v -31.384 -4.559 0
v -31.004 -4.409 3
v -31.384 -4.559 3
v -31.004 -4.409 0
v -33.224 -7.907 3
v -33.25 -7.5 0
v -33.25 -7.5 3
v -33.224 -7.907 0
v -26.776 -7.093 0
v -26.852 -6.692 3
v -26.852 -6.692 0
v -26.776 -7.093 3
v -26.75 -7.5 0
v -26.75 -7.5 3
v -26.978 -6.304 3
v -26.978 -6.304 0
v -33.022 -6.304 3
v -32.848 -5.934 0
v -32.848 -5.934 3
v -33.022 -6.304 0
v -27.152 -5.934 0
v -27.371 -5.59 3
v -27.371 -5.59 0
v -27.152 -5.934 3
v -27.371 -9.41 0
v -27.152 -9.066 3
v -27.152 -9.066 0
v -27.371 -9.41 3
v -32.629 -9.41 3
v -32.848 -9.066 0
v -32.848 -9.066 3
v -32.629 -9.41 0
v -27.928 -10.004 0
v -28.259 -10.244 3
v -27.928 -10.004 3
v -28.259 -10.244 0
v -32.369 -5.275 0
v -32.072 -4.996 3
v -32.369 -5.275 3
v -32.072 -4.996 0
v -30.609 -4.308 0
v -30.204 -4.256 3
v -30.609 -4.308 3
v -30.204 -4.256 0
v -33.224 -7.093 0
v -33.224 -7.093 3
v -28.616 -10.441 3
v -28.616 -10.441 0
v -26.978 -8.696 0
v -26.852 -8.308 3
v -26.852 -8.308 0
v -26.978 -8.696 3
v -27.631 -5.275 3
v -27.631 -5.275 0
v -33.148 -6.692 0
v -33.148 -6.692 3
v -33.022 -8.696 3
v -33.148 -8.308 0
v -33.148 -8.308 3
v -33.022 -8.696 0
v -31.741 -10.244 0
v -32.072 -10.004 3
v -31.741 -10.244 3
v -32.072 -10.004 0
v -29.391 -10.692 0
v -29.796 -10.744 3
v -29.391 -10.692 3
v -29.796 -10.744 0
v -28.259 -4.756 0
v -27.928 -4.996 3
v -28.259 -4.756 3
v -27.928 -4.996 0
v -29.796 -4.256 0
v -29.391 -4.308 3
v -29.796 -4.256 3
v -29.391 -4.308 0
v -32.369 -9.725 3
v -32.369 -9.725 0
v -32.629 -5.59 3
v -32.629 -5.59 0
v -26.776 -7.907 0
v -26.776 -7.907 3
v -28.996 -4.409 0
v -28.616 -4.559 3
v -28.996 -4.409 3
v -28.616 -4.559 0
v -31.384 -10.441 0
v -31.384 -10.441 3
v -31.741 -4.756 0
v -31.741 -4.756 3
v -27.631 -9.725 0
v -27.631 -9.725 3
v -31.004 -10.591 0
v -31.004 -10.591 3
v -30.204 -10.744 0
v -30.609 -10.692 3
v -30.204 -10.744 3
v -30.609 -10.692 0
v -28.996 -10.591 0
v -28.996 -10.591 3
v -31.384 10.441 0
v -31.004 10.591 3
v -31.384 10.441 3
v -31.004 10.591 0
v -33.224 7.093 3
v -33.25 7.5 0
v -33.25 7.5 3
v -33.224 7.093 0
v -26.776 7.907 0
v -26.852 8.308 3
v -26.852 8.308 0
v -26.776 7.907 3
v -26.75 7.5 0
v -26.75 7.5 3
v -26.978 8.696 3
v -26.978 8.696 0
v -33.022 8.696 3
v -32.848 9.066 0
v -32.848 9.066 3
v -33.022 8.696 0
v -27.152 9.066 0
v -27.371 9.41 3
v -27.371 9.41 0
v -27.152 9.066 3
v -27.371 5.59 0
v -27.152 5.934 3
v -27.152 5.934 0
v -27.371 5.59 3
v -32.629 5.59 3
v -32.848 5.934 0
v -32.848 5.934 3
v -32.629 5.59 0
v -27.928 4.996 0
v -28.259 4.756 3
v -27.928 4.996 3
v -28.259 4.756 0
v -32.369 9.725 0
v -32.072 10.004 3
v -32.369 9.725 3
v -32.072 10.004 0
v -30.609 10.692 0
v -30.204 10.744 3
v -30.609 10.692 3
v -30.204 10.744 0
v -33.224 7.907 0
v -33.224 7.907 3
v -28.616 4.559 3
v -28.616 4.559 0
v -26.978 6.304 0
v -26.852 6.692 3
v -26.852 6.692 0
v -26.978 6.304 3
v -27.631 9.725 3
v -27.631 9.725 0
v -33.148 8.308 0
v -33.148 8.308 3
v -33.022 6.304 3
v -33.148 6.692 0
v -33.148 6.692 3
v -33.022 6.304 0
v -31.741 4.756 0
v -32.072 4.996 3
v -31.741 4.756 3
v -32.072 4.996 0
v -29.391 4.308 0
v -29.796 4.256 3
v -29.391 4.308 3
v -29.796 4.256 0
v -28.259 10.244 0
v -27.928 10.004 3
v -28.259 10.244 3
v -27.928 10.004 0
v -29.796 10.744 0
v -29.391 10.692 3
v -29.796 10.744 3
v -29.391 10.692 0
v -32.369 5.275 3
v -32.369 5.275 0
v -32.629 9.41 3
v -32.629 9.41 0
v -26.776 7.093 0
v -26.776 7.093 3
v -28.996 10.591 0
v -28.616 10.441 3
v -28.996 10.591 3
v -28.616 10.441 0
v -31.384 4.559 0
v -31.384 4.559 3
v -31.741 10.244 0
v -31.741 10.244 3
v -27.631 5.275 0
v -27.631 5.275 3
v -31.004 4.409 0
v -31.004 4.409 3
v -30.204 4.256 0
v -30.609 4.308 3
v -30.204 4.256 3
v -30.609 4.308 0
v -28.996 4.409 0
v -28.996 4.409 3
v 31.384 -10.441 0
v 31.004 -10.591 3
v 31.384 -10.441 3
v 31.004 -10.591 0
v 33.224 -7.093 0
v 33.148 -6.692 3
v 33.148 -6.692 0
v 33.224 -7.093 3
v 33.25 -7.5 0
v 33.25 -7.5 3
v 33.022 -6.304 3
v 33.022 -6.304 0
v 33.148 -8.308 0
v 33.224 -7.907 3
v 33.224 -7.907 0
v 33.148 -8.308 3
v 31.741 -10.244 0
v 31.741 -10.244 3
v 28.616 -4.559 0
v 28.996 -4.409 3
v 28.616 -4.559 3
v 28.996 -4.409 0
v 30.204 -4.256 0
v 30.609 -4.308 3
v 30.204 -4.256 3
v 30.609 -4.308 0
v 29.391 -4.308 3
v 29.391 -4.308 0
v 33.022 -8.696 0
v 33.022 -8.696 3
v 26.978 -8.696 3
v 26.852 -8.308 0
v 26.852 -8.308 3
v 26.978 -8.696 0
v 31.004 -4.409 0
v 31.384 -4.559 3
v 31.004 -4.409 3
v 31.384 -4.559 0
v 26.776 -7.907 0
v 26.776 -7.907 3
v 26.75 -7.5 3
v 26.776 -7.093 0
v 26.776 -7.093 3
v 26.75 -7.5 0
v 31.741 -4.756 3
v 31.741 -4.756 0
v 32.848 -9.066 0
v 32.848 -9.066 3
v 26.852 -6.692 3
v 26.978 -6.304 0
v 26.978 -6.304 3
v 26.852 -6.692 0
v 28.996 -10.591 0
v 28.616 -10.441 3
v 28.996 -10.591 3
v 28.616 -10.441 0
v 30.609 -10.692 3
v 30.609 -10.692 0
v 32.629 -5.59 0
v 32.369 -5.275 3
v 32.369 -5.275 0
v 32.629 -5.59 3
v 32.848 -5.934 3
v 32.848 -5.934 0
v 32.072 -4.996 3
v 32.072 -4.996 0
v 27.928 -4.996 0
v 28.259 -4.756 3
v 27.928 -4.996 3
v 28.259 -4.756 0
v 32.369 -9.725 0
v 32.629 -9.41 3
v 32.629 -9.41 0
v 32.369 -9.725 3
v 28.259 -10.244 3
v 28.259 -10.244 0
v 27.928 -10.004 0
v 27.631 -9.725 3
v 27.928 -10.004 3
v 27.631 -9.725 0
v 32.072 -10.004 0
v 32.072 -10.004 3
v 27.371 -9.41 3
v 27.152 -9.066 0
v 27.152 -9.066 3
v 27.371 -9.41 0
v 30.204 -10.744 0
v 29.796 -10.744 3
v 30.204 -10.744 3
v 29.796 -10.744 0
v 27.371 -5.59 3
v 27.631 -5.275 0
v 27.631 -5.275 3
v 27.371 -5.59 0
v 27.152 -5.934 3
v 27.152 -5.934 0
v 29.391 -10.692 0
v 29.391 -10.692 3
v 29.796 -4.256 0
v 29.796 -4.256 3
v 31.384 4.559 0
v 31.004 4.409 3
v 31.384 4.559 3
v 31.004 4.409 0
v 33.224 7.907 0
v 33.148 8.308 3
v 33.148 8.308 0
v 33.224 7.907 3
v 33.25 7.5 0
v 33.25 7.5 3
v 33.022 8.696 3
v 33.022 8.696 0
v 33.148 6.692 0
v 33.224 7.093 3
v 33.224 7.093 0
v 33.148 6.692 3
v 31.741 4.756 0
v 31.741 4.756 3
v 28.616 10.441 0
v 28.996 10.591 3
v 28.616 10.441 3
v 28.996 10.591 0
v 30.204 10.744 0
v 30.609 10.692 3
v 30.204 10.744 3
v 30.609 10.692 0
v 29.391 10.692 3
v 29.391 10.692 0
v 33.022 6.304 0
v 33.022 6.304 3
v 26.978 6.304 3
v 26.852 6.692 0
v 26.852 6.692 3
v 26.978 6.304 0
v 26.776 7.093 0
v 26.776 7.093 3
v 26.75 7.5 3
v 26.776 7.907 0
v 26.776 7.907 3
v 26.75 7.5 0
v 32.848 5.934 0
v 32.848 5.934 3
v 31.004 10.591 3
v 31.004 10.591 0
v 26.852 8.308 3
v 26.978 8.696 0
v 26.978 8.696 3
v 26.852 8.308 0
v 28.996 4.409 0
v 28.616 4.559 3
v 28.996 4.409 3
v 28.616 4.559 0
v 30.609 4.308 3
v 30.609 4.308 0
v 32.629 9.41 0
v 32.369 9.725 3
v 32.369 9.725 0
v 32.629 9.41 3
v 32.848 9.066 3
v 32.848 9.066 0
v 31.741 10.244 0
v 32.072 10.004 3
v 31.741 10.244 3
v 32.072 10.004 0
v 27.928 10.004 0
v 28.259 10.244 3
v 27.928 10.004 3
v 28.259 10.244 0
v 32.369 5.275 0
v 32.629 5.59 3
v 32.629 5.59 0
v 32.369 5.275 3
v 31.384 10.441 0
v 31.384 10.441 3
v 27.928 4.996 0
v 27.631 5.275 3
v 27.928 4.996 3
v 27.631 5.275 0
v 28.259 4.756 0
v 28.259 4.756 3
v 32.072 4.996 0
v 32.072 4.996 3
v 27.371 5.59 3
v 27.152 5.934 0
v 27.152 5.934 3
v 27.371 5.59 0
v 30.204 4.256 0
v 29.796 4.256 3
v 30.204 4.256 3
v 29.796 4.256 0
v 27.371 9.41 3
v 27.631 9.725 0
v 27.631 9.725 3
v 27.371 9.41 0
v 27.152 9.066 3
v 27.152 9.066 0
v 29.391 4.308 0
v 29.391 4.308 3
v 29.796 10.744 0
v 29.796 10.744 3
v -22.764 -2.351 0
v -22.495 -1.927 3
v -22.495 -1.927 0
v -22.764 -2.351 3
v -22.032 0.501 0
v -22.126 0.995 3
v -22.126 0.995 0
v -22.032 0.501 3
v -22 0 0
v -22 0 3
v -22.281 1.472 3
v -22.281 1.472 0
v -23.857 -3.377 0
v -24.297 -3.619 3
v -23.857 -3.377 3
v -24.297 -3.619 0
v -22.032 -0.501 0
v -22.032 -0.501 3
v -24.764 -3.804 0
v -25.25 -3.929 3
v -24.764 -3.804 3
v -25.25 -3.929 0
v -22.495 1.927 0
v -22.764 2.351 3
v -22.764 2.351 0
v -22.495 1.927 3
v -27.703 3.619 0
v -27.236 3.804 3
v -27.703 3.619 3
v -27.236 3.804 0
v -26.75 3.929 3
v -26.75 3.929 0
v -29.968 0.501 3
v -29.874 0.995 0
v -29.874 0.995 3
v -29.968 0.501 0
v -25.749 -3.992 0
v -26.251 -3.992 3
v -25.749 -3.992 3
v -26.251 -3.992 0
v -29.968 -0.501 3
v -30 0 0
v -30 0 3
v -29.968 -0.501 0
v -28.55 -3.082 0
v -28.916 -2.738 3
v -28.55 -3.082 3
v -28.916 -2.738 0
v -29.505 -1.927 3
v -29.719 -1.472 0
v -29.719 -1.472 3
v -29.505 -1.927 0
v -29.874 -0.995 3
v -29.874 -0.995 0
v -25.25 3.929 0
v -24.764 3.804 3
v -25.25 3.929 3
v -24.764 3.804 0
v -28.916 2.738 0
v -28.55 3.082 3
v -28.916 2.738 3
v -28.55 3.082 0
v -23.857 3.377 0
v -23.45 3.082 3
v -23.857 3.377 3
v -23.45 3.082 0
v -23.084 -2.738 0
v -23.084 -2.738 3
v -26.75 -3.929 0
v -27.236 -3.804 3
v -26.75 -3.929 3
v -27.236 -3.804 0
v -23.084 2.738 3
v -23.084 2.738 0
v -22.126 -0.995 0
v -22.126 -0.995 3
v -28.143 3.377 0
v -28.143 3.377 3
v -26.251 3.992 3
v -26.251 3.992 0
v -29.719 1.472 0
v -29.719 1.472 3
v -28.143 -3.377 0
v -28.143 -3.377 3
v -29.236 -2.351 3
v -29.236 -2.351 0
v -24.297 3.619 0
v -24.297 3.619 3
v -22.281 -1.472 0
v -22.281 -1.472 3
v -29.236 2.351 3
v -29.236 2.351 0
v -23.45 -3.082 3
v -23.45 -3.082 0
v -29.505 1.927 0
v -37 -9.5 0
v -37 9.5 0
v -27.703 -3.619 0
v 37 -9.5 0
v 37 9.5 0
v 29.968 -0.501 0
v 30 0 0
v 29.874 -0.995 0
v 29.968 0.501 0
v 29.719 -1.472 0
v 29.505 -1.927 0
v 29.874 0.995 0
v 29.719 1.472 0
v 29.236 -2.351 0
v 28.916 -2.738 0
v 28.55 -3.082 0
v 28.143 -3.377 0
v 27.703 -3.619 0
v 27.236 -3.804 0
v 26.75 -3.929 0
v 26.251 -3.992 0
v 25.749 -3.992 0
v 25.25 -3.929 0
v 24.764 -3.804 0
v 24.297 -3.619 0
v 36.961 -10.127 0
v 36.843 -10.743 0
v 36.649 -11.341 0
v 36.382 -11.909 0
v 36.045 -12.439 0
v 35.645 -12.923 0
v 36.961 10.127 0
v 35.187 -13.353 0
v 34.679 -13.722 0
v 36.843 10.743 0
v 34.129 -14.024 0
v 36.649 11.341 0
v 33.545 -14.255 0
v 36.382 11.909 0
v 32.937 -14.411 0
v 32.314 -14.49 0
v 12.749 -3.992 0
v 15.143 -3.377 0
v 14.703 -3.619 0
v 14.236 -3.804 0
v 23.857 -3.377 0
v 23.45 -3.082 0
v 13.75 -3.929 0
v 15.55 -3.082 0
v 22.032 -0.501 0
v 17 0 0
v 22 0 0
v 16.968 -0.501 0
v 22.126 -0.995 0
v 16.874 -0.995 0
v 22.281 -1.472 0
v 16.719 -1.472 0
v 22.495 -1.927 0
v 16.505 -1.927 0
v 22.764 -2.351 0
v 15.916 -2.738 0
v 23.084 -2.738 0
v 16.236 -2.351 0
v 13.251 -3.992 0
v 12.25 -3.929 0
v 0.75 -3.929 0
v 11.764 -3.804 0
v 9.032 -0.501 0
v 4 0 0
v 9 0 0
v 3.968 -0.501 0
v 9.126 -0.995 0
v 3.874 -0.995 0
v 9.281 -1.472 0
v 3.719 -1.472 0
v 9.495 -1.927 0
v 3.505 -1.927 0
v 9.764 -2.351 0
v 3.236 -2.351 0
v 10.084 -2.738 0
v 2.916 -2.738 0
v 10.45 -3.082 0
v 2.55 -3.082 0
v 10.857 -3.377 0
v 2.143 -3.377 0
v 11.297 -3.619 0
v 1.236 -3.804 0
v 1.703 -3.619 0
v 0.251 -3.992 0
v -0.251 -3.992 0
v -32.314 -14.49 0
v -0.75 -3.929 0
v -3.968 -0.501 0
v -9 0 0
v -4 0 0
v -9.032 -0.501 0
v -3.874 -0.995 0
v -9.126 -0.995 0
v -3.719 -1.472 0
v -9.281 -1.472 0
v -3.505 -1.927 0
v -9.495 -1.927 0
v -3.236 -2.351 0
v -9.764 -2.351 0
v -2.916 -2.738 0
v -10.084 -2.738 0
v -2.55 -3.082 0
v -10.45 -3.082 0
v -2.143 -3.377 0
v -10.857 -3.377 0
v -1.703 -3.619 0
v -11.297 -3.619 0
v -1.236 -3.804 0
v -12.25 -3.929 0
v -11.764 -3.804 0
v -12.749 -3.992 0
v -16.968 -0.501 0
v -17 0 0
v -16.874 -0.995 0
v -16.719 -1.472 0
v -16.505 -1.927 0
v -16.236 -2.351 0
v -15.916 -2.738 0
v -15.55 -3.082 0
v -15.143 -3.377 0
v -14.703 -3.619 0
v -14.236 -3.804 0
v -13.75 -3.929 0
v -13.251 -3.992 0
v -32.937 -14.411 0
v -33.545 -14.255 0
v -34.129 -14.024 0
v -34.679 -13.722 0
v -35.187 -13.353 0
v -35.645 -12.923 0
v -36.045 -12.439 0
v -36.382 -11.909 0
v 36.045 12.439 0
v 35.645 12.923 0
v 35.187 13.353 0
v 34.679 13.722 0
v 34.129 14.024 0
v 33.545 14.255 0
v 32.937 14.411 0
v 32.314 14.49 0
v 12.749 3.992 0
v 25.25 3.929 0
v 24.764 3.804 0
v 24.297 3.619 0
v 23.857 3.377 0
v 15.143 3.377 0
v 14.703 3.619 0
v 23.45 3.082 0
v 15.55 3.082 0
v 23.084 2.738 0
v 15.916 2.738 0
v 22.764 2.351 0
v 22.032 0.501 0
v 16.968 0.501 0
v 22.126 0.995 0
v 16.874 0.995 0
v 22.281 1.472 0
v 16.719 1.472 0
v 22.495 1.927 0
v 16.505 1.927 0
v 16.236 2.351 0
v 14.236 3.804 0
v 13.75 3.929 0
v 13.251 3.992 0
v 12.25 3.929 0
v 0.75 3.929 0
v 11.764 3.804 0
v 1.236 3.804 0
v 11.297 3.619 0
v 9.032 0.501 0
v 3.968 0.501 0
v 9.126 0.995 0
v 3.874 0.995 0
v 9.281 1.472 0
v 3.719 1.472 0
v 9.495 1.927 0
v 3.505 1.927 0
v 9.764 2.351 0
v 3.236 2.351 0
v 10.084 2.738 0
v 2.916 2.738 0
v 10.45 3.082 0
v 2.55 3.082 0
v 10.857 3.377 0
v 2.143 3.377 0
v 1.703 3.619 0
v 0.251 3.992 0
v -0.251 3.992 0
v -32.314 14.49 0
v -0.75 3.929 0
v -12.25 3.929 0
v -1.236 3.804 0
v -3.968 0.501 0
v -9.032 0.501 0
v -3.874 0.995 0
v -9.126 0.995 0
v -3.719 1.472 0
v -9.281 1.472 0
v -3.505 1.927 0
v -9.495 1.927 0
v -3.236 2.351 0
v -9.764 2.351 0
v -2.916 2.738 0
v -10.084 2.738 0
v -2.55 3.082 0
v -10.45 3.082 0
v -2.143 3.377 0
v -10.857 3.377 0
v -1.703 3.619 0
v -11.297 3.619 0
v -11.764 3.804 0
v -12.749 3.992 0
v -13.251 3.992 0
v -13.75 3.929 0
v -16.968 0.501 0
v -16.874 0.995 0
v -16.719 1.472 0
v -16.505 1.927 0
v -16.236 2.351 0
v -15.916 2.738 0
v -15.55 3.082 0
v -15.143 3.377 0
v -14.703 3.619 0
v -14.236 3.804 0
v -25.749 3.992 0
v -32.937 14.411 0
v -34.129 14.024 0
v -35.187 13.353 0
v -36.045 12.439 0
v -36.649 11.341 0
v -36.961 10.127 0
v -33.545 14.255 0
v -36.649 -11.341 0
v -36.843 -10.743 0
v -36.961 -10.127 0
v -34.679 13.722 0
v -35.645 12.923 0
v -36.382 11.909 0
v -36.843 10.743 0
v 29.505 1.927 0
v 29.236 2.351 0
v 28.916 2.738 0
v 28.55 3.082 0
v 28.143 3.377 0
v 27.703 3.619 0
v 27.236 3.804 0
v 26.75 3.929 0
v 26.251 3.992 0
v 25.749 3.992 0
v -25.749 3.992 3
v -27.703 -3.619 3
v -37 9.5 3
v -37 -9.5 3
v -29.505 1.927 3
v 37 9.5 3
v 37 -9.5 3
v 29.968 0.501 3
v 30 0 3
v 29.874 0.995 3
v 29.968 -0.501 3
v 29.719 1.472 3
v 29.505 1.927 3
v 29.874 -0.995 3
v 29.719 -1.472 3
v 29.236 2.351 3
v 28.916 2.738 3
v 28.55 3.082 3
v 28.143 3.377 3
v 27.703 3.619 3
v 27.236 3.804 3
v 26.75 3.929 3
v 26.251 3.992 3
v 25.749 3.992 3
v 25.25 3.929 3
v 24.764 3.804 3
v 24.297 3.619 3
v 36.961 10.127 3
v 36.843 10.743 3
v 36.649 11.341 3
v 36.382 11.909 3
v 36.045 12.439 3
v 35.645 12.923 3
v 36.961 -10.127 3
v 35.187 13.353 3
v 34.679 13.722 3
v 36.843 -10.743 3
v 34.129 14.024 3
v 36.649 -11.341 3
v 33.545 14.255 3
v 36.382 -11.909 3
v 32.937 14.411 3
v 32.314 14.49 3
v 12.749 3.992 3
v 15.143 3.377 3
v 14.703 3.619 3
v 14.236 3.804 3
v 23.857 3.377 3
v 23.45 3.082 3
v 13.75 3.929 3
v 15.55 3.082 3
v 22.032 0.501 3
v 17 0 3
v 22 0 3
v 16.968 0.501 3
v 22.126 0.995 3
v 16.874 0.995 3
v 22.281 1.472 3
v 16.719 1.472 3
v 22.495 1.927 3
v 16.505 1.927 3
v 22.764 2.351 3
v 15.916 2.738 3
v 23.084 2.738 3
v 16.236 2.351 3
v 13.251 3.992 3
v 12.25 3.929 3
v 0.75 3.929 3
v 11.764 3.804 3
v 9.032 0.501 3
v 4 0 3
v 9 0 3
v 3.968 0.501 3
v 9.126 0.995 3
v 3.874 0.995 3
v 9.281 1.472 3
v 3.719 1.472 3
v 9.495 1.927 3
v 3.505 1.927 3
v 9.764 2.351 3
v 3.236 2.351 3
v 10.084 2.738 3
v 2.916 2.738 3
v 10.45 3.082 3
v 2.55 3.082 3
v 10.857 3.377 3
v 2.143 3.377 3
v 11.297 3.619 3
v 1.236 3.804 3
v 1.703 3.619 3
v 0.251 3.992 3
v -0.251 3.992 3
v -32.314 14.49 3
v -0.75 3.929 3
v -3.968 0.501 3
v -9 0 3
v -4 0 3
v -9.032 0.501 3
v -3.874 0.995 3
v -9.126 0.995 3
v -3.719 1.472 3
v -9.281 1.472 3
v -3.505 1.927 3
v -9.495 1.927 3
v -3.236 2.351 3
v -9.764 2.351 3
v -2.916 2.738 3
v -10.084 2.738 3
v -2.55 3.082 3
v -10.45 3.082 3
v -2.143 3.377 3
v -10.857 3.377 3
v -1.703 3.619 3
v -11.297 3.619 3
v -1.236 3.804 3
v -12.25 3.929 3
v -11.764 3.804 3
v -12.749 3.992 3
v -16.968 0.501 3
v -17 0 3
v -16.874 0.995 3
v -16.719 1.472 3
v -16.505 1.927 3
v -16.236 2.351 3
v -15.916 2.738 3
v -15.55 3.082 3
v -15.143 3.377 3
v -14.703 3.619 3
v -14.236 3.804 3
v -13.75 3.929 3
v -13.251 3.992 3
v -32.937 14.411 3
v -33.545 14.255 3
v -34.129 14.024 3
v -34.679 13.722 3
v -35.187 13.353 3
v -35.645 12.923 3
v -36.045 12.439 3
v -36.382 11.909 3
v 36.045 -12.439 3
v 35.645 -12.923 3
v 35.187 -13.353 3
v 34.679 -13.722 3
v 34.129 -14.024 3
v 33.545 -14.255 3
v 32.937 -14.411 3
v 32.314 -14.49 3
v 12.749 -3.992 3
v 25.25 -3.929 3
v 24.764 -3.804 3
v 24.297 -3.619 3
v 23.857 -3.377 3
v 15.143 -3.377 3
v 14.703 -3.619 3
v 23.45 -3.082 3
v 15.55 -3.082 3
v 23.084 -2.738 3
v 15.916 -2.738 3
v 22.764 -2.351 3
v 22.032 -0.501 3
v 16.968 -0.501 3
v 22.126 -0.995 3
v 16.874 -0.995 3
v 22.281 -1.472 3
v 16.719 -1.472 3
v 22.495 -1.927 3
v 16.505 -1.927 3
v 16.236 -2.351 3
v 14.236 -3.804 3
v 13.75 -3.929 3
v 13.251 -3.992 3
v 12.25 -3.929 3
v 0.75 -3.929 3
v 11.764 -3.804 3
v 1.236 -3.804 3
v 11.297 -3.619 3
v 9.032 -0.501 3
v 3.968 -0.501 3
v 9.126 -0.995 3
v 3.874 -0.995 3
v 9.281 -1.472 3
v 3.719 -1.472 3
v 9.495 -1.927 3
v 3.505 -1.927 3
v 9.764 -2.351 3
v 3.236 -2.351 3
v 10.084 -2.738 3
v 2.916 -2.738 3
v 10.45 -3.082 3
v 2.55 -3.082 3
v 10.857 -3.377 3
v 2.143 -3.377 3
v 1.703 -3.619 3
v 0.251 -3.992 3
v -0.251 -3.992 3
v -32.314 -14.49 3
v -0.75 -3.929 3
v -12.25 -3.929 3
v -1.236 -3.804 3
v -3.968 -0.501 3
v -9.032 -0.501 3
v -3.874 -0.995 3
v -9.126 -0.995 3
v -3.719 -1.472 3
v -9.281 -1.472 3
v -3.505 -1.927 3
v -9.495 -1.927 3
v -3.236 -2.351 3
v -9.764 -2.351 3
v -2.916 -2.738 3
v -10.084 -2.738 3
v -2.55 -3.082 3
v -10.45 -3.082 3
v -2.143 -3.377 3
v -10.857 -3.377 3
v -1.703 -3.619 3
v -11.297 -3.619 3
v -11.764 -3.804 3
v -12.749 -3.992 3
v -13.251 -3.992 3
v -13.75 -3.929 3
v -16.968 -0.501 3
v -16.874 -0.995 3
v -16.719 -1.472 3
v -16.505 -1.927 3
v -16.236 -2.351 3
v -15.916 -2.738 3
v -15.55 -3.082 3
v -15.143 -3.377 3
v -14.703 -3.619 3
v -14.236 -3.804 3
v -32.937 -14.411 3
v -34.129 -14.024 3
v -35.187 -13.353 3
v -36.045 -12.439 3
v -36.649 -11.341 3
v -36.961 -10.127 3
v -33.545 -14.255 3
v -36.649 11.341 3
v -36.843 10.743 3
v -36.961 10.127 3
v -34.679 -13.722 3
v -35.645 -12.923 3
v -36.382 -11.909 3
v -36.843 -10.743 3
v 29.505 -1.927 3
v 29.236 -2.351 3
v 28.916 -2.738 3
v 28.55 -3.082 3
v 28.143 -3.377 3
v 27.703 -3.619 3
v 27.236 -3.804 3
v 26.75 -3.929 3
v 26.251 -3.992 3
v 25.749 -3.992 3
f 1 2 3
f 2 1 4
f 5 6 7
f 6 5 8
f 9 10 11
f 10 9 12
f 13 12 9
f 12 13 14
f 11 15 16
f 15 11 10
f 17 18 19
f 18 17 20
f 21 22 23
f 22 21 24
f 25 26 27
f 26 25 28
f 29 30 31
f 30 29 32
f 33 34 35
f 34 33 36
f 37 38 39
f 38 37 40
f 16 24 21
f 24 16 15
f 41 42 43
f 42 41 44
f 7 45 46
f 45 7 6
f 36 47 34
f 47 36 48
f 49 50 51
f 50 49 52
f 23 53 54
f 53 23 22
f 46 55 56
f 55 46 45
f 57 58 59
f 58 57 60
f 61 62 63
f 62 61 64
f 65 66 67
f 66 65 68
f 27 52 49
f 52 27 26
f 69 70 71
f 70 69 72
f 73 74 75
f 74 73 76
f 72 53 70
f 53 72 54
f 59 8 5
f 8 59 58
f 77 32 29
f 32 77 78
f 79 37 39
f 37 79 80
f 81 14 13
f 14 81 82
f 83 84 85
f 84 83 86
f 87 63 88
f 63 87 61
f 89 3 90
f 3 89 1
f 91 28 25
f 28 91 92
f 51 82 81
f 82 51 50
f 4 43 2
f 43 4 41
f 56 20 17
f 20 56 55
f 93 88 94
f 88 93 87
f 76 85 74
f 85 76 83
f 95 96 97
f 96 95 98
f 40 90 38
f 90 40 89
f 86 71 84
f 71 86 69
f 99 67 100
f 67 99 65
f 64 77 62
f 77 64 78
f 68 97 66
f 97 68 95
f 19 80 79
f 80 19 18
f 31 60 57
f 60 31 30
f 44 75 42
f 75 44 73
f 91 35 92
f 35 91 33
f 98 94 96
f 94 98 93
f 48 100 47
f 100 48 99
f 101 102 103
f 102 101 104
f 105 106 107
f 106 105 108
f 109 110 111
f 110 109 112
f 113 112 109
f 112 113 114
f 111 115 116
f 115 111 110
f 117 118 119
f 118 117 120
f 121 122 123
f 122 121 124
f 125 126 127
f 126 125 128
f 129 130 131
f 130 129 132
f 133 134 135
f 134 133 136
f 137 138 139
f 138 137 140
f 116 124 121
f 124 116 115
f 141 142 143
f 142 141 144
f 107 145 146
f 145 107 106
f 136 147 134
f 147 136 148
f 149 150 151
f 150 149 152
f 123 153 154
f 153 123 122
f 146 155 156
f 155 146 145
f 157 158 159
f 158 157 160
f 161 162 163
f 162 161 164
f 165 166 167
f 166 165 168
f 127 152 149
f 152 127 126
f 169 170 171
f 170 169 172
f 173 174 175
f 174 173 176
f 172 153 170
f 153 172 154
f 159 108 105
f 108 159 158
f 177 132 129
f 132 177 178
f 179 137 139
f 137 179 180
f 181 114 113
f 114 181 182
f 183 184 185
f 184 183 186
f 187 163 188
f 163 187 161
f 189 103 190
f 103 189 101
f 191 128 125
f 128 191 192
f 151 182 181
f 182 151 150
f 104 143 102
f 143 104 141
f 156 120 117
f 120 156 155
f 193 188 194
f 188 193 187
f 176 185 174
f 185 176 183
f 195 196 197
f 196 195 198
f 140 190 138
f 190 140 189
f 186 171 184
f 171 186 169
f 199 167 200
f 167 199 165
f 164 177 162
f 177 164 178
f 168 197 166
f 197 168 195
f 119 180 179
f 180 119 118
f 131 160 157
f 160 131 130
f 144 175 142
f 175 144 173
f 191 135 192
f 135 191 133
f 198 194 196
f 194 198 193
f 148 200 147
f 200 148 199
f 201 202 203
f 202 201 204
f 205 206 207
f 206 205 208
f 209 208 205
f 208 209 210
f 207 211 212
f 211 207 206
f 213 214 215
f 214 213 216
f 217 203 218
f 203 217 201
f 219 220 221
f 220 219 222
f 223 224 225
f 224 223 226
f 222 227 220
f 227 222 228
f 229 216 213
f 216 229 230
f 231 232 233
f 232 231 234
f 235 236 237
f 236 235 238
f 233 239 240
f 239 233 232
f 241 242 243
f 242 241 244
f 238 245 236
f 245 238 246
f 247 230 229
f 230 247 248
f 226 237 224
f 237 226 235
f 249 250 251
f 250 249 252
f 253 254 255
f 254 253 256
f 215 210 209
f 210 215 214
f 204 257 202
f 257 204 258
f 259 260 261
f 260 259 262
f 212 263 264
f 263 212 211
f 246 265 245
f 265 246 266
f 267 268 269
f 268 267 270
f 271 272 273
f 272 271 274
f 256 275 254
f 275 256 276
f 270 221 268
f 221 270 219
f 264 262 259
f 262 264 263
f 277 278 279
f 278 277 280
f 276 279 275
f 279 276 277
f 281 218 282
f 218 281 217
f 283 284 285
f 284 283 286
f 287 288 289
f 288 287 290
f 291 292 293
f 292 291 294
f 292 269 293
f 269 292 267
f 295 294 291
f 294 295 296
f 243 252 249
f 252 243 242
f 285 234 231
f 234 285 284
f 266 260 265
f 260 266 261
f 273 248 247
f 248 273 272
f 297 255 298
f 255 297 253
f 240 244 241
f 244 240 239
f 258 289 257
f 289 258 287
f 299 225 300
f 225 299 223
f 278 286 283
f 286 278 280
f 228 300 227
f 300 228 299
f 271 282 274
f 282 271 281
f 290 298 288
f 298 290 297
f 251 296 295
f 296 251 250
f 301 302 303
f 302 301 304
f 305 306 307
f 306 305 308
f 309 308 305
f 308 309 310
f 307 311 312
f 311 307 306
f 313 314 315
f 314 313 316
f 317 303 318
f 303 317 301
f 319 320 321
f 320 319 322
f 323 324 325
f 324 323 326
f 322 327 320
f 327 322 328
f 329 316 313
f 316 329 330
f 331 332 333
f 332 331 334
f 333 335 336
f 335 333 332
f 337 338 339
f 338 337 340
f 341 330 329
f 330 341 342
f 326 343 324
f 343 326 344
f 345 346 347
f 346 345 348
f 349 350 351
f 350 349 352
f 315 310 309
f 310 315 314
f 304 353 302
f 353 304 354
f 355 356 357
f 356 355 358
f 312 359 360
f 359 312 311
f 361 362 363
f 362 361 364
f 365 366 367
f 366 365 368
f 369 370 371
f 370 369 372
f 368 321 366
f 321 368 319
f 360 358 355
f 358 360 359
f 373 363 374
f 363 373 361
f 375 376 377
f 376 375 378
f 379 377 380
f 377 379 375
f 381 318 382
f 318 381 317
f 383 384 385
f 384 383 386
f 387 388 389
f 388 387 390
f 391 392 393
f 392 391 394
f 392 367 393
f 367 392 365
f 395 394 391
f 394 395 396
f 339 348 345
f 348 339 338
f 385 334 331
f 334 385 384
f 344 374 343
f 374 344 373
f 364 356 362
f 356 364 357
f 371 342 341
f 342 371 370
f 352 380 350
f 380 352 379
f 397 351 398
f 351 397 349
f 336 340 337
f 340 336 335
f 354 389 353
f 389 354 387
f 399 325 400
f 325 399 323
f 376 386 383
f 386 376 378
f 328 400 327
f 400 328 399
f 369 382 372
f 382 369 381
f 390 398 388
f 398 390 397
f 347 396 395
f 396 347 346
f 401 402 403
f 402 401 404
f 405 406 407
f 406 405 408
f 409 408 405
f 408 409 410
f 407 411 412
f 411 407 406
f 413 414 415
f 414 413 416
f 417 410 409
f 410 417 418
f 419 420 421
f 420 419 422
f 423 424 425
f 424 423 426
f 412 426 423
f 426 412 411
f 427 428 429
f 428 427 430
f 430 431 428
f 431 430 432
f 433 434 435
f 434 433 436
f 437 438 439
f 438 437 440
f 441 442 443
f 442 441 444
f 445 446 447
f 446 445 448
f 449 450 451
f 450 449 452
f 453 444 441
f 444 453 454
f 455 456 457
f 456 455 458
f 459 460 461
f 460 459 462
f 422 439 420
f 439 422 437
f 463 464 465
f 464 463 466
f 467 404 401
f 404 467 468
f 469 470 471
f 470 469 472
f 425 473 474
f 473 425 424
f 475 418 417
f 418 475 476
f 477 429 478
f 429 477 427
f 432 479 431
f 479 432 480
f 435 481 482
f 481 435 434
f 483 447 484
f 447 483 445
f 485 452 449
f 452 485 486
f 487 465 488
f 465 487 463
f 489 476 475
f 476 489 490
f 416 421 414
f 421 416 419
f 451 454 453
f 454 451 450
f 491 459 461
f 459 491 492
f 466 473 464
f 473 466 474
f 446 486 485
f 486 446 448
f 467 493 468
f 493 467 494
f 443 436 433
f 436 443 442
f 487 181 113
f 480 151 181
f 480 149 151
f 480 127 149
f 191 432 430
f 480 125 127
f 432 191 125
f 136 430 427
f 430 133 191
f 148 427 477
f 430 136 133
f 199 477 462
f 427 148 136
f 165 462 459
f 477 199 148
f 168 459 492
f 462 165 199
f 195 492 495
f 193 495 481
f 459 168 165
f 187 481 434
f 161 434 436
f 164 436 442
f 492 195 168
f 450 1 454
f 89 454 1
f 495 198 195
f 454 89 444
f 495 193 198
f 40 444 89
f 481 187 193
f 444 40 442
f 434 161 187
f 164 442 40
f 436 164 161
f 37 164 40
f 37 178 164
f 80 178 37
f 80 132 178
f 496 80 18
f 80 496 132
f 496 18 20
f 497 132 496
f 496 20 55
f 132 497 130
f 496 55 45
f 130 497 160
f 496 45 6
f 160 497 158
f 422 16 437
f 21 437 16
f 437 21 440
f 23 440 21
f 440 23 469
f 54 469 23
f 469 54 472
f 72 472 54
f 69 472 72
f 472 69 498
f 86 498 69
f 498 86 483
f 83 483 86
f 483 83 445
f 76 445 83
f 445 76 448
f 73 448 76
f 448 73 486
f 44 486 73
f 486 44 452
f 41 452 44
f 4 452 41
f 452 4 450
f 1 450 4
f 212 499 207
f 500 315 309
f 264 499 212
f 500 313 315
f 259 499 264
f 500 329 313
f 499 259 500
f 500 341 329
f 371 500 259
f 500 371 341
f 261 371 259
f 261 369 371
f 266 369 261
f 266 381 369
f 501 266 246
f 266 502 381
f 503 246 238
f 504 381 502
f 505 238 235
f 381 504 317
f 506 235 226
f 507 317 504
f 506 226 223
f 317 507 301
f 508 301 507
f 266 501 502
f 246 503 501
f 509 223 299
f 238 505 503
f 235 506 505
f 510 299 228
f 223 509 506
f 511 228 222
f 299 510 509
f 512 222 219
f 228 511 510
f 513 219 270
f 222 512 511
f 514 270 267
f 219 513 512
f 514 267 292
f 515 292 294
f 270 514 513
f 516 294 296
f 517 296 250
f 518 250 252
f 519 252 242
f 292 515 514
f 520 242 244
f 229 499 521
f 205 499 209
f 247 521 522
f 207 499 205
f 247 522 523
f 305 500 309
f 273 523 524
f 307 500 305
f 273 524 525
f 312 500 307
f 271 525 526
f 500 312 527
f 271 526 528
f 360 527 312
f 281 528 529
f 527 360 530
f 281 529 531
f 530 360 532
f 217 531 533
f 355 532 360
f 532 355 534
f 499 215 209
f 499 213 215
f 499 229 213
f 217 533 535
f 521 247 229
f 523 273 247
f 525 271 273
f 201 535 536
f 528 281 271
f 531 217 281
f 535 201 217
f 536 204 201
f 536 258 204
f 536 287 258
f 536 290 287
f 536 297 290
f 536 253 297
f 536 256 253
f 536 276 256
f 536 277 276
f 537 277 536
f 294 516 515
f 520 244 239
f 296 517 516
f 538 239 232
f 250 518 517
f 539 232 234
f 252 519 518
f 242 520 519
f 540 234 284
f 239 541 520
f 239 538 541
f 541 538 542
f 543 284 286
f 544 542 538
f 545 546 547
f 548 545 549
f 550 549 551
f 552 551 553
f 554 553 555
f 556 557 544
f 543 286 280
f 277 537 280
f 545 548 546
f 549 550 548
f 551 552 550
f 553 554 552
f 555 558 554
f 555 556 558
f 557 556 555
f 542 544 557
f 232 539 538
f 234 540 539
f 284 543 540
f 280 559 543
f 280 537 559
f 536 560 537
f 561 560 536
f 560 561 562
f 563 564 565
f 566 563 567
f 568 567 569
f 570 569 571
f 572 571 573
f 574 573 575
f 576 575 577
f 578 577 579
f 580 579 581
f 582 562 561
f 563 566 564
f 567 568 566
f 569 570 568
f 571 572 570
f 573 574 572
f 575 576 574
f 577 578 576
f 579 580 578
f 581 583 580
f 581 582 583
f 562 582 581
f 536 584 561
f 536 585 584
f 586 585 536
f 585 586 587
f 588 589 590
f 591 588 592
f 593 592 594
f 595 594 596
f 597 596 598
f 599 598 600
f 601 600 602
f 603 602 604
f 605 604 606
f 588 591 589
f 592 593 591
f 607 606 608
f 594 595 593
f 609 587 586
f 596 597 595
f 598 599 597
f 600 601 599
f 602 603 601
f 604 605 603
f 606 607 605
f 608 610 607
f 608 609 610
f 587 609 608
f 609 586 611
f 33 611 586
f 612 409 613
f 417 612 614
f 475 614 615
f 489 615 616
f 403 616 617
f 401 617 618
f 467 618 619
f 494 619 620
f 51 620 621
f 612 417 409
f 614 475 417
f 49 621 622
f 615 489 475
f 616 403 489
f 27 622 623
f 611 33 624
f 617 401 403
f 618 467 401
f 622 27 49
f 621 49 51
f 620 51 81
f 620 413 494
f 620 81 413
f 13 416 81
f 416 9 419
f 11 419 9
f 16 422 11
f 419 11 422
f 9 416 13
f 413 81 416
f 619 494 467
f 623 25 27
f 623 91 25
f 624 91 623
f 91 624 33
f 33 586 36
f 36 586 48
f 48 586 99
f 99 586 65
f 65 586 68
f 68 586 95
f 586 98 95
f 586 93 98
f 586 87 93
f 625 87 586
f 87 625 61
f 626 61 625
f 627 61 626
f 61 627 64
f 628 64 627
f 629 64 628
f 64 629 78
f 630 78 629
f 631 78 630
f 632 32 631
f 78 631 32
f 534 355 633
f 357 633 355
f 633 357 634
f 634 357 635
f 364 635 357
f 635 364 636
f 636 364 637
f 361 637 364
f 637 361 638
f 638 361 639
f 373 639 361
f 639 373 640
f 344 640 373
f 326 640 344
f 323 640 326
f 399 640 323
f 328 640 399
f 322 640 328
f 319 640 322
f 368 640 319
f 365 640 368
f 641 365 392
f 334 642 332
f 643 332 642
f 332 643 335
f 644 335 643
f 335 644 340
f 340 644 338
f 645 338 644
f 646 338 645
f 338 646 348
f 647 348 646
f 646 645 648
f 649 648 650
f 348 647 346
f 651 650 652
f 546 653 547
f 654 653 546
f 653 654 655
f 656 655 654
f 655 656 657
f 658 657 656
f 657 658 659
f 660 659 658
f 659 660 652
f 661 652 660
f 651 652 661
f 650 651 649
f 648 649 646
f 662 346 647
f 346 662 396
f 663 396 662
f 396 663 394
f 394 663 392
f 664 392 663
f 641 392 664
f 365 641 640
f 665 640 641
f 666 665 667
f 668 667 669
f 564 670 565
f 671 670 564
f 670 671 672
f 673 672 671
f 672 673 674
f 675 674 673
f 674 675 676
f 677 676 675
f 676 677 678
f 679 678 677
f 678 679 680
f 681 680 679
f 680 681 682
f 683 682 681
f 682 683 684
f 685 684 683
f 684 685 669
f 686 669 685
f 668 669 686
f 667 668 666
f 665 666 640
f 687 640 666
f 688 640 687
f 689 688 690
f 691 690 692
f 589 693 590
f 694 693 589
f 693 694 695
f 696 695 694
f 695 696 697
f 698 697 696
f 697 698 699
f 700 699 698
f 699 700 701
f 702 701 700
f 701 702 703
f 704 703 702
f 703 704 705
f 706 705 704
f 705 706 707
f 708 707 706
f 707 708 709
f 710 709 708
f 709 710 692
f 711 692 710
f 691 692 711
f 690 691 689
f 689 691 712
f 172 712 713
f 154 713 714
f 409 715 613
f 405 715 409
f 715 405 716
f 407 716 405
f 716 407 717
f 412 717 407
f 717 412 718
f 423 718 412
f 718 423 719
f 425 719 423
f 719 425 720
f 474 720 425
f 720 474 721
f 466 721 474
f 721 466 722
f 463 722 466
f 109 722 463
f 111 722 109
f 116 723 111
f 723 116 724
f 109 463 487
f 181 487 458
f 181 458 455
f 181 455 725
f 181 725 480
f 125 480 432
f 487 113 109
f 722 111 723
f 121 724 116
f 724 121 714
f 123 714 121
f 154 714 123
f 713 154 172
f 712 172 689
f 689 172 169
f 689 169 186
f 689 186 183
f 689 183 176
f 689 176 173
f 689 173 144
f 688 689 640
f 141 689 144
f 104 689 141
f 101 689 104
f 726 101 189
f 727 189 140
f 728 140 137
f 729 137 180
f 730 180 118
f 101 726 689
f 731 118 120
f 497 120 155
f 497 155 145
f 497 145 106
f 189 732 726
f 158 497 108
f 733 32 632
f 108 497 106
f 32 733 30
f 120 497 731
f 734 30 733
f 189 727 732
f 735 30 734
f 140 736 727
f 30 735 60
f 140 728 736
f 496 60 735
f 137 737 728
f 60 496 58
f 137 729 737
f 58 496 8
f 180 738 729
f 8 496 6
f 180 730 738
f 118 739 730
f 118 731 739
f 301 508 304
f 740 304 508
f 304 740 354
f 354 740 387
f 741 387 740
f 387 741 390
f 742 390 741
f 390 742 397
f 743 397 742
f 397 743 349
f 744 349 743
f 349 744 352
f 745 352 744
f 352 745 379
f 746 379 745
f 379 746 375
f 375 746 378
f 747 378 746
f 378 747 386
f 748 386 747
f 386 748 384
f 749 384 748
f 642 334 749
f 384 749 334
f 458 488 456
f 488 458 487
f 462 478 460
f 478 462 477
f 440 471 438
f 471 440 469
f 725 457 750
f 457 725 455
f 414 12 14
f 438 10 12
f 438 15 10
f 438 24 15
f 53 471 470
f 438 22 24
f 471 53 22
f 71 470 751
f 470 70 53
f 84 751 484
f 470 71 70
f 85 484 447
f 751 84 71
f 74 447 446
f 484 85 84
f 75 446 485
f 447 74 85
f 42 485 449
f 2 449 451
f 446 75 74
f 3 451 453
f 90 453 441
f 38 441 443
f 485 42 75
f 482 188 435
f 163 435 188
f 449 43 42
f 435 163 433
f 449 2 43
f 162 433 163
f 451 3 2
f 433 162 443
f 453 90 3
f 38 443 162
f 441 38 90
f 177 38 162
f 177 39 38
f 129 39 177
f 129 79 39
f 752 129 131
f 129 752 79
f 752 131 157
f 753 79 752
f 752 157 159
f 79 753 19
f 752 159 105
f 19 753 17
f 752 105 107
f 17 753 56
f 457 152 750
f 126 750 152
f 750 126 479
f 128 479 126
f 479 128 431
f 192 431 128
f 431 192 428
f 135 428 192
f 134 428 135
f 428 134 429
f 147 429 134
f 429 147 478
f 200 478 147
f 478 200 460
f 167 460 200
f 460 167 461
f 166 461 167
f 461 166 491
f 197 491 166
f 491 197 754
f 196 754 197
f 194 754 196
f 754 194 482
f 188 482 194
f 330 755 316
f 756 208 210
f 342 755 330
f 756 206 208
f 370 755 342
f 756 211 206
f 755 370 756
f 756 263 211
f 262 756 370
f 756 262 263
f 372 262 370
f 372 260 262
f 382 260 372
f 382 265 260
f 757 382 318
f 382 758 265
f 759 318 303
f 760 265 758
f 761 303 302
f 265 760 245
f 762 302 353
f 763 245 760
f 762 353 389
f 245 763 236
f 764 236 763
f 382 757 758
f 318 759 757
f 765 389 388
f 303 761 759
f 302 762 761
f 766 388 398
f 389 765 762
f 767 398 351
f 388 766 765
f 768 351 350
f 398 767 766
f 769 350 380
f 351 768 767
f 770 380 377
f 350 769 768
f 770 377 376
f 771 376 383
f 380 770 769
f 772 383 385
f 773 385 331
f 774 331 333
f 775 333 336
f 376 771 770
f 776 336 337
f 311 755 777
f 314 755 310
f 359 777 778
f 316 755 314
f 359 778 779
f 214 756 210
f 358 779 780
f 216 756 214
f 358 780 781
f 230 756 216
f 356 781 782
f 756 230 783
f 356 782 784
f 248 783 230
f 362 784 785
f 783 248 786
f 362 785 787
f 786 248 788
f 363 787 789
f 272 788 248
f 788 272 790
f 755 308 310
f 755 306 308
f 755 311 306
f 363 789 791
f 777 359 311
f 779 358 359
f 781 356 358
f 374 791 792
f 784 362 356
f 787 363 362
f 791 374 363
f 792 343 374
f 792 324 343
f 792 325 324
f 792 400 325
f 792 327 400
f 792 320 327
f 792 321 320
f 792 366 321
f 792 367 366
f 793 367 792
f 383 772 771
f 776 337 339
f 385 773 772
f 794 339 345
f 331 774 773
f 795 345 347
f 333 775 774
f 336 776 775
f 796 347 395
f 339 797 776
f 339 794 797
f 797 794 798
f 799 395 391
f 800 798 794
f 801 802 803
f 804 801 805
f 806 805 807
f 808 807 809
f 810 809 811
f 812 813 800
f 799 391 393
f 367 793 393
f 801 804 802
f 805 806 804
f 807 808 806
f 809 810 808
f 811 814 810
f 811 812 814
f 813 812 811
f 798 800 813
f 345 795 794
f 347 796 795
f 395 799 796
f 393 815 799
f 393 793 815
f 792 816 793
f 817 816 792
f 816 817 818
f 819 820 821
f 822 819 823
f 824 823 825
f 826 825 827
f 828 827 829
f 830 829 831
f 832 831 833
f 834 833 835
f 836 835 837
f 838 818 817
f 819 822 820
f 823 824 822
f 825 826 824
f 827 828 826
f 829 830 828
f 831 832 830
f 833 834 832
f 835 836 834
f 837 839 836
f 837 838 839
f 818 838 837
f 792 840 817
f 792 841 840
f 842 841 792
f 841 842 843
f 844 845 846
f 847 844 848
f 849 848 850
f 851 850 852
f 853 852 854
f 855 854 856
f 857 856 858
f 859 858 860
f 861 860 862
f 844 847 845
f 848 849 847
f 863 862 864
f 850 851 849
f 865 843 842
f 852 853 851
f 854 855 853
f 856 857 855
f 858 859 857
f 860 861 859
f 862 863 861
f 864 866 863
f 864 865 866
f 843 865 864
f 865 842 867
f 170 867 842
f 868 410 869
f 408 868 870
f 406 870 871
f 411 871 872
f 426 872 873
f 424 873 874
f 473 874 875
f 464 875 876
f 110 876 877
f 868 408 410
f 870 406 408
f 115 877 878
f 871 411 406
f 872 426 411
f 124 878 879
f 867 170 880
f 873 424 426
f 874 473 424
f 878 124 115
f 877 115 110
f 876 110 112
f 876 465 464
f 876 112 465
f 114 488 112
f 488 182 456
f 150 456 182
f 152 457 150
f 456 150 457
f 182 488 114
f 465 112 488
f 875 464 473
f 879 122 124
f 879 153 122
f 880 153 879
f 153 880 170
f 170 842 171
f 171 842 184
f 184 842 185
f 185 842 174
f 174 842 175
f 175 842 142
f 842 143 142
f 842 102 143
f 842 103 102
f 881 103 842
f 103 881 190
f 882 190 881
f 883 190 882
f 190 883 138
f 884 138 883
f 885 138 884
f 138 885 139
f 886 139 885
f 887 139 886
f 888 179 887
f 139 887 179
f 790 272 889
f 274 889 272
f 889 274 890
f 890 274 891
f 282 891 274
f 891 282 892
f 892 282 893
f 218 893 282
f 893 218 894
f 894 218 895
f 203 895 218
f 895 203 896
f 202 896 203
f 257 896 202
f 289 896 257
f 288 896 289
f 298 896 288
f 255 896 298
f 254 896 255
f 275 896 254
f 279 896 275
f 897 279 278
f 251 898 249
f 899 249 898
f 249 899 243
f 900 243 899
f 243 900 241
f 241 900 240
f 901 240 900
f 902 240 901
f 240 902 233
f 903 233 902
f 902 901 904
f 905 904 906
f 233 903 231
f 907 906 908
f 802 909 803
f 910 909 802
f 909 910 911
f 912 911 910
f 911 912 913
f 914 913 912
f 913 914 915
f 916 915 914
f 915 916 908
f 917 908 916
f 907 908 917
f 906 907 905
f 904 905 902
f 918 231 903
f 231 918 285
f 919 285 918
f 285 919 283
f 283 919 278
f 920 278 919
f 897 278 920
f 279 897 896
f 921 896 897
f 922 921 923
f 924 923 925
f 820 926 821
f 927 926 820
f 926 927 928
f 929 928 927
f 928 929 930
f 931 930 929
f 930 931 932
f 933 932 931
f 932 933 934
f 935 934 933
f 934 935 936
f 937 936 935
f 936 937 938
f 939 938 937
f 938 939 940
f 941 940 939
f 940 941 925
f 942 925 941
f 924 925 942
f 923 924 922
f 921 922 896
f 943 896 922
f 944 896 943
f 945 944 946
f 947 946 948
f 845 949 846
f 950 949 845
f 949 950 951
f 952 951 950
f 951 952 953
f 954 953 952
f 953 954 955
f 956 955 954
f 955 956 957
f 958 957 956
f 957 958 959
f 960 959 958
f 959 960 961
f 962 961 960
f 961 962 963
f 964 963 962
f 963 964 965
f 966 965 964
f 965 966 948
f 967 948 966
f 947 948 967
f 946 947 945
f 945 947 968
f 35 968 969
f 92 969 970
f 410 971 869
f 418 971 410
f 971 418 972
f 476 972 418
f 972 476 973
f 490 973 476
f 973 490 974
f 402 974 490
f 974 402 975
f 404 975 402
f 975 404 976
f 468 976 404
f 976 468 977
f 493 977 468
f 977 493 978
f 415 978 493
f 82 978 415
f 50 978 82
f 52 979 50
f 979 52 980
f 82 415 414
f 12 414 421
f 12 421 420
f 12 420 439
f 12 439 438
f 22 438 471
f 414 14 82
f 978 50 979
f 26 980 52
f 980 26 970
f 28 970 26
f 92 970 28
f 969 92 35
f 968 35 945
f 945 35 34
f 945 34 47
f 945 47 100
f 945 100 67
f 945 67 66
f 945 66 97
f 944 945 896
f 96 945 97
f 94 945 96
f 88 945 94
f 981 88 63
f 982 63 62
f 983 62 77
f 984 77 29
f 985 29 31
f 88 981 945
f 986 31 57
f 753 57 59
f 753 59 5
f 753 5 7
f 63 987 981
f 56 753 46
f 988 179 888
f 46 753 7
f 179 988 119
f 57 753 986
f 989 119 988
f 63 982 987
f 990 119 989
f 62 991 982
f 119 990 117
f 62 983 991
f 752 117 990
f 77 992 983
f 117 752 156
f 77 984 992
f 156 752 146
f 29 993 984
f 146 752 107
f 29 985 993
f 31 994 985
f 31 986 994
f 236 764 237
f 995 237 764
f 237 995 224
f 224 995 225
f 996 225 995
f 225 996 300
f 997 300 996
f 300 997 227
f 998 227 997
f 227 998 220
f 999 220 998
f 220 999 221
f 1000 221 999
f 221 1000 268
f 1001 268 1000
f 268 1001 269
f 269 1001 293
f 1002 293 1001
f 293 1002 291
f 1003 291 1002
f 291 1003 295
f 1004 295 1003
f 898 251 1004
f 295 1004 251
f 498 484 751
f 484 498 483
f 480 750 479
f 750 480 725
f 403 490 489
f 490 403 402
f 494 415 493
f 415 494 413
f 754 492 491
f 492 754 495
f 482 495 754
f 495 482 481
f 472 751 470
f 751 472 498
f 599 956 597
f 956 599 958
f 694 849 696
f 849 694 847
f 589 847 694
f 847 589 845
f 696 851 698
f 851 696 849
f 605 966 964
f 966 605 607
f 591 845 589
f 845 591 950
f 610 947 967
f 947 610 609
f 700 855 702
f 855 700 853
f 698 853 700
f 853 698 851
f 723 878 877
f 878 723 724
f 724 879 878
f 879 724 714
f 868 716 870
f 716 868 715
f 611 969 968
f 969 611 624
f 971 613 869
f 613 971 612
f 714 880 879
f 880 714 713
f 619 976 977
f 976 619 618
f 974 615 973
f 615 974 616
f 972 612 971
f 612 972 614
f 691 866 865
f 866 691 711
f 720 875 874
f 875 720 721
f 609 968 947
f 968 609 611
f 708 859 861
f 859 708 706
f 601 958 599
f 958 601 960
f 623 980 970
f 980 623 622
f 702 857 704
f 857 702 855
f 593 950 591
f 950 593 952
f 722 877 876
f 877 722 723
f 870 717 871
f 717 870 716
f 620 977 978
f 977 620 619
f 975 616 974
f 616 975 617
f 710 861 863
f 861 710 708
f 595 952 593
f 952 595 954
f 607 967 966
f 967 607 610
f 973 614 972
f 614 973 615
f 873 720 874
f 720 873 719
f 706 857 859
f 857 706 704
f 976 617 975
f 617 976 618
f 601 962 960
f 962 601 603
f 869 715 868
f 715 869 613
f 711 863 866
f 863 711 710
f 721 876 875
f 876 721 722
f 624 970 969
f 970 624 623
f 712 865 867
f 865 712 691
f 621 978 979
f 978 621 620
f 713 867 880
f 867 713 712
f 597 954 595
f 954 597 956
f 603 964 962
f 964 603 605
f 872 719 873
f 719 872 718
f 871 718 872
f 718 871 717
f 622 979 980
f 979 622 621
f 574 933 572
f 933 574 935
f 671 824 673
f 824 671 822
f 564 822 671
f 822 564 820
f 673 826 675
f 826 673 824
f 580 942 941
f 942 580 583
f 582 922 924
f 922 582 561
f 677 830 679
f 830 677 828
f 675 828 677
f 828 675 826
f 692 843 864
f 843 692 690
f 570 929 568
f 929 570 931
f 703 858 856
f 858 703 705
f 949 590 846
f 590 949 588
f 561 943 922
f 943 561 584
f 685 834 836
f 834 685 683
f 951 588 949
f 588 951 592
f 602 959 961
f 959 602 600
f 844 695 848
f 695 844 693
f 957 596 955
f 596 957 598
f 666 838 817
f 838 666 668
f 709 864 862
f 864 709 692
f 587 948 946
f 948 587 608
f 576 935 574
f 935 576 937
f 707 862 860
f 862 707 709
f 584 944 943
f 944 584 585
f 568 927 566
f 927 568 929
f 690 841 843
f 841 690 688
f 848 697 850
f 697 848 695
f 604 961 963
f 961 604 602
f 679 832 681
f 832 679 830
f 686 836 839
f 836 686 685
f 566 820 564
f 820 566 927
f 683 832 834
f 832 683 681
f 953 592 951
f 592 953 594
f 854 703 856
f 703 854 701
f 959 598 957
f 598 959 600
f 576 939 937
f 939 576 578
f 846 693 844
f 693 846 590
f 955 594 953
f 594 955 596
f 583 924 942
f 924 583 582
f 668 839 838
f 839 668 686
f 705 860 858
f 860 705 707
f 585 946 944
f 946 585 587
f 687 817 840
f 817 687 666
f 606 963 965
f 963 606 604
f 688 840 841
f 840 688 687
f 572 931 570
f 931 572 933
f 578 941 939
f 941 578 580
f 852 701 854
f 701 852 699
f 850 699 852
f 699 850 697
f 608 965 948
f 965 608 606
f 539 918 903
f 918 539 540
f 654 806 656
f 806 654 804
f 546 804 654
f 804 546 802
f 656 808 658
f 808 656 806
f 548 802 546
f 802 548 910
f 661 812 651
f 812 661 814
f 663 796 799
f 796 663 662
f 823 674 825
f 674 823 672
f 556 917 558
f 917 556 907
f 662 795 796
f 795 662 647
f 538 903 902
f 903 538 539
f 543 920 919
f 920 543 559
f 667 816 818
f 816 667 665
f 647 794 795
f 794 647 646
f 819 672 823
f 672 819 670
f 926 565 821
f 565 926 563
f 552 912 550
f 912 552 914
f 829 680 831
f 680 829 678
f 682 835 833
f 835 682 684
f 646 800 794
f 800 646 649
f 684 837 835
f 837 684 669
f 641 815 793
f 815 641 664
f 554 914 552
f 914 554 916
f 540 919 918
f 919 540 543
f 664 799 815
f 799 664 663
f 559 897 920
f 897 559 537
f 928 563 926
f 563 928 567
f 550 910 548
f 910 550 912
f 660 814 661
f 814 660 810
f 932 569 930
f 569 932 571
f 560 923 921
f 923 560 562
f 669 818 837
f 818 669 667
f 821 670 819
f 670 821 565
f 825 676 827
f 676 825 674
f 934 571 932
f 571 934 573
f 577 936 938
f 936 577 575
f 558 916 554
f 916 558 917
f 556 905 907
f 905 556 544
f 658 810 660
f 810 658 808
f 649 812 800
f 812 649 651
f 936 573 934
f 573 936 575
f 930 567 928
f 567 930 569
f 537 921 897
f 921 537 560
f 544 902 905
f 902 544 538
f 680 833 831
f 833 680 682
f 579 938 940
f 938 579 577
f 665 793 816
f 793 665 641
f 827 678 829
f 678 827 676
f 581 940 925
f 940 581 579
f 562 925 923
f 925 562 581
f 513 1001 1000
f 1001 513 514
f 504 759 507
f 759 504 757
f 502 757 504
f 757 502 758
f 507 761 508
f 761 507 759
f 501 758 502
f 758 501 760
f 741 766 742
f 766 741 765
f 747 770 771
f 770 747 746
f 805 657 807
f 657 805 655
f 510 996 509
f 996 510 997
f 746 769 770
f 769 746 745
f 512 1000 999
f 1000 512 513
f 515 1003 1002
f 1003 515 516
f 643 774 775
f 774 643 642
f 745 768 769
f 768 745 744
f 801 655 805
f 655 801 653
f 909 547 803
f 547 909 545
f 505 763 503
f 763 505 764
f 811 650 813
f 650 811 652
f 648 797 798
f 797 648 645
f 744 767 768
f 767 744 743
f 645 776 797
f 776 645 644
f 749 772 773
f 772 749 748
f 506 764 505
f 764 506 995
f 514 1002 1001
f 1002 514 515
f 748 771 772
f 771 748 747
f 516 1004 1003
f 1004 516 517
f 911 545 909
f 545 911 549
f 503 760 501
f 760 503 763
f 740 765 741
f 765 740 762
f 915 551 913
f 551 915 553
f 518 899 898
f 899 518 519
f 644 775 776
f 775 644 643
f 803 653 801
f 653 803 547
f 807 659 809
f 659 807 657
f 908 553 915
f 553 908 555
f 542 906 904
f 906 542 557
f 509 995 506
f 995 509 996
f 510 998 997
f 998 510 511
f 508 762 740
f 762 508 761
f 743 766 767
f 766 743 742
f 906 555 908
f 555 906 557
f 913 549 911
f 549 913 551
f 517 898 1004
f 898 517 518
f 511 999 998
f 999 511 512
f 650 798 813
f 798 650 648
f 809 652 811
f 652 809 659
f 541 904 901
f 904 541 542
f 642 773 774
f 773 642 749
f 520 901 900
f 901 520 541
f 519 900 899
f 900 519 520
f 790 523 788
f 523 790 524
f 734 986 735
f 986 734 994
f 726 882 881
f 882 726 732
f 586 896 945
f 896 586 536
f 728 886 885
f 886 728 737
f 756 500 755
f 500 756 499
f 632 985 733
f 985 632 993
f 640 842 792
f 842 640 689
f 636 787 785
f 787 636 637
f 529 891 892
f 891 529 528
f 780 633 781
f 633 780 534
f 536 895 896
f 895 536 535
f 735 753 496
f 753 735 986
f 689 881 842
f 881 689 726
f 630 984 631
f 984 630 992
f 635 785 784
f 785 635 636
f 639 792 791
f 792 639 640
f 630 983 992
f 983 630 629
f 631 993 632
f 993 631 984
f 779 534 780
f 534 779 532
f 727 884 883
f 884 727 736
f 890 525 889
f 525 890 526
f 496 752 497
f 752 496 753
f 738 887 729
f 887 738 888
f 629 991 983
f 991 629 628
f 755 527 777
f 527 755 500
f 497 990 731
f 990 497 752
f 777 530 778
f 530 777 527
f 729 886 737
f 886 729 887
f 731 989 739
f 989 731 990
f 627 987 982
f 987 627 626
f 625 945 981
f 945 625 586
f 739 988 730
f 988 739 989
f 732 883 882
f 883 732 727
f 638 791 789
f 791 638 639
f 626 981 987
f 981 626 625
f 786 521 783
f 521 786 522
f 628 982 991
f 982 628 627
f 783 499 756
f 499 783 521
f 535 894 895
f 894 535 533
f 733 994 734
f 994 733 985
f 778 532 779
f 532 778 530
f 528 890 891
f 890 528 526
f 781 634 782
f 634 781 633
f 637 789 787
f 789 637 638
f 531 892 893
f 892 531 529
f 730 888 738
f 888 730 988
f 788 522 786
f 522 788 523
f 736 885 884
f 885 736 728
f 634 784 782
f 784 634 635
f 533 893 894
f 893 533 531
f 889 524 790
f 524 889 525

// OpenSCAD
$fn = 50;


difference() {
	union() {
		hull() {
			translate(v = [-32.0000000000, 9.5000000000, 0]) {
				cylinder(h = 3, r = 5);
			}
			translate(v = [32.0000000000, 9.5000000000, 0]) {
				cylinder(h = 3, r = 5);
			}
			translate(v = [-32.0000000000, -9.5000000000, 0]) {
				cylinder(h = 3, r = 5);
			}
			translate(v = [32.0000000000, -9.5000000000, 0]) {
				cylinder(h = 3, r = 5);
			}
		}
	}
	union() {
		#translate(v = [-30.0000000000, -7.5000000000, -100.0000000000]) {
			cylinder(h = 200, r = 3.2500000000);
		}
		#translate(v = [-30.0000000000, 7.5000000000, -100.0000000000]) {
			cylinder(h = 200, r = 3.2500000000);
		}
		#translate(v = [30.0000000000, -7.5000000000, -100.0000000000]) {
			cylinder(h = 200, r = 3.2500000000);
		}
		#translate(v = [30.0000000000, 7.5000000000, -100.0000000000]) {
			cylinder(h = 200, r = 3.2500000000);
		}
		#translate(v = [-26.0000000000, 0, 0]) {
			cylinder(h = 3, r = 4.0000000000);
		}
		#translate(v = [-13.0000000000, 0, 0]) {
			cylinder(h = 3, r = 4.0000000000);
		}
		#cylinder(h = 3, r = 4.0000000000);
		#translate(v = [13.0000000000, 0, 0]) {
			cylinder(h = 3, r = 4.0000000000);
		}
		#translate(v = [26.0000000000, 0, 0]) {
			cylinder(h = 3, r = 4.0000000000);
		}
	}
}
